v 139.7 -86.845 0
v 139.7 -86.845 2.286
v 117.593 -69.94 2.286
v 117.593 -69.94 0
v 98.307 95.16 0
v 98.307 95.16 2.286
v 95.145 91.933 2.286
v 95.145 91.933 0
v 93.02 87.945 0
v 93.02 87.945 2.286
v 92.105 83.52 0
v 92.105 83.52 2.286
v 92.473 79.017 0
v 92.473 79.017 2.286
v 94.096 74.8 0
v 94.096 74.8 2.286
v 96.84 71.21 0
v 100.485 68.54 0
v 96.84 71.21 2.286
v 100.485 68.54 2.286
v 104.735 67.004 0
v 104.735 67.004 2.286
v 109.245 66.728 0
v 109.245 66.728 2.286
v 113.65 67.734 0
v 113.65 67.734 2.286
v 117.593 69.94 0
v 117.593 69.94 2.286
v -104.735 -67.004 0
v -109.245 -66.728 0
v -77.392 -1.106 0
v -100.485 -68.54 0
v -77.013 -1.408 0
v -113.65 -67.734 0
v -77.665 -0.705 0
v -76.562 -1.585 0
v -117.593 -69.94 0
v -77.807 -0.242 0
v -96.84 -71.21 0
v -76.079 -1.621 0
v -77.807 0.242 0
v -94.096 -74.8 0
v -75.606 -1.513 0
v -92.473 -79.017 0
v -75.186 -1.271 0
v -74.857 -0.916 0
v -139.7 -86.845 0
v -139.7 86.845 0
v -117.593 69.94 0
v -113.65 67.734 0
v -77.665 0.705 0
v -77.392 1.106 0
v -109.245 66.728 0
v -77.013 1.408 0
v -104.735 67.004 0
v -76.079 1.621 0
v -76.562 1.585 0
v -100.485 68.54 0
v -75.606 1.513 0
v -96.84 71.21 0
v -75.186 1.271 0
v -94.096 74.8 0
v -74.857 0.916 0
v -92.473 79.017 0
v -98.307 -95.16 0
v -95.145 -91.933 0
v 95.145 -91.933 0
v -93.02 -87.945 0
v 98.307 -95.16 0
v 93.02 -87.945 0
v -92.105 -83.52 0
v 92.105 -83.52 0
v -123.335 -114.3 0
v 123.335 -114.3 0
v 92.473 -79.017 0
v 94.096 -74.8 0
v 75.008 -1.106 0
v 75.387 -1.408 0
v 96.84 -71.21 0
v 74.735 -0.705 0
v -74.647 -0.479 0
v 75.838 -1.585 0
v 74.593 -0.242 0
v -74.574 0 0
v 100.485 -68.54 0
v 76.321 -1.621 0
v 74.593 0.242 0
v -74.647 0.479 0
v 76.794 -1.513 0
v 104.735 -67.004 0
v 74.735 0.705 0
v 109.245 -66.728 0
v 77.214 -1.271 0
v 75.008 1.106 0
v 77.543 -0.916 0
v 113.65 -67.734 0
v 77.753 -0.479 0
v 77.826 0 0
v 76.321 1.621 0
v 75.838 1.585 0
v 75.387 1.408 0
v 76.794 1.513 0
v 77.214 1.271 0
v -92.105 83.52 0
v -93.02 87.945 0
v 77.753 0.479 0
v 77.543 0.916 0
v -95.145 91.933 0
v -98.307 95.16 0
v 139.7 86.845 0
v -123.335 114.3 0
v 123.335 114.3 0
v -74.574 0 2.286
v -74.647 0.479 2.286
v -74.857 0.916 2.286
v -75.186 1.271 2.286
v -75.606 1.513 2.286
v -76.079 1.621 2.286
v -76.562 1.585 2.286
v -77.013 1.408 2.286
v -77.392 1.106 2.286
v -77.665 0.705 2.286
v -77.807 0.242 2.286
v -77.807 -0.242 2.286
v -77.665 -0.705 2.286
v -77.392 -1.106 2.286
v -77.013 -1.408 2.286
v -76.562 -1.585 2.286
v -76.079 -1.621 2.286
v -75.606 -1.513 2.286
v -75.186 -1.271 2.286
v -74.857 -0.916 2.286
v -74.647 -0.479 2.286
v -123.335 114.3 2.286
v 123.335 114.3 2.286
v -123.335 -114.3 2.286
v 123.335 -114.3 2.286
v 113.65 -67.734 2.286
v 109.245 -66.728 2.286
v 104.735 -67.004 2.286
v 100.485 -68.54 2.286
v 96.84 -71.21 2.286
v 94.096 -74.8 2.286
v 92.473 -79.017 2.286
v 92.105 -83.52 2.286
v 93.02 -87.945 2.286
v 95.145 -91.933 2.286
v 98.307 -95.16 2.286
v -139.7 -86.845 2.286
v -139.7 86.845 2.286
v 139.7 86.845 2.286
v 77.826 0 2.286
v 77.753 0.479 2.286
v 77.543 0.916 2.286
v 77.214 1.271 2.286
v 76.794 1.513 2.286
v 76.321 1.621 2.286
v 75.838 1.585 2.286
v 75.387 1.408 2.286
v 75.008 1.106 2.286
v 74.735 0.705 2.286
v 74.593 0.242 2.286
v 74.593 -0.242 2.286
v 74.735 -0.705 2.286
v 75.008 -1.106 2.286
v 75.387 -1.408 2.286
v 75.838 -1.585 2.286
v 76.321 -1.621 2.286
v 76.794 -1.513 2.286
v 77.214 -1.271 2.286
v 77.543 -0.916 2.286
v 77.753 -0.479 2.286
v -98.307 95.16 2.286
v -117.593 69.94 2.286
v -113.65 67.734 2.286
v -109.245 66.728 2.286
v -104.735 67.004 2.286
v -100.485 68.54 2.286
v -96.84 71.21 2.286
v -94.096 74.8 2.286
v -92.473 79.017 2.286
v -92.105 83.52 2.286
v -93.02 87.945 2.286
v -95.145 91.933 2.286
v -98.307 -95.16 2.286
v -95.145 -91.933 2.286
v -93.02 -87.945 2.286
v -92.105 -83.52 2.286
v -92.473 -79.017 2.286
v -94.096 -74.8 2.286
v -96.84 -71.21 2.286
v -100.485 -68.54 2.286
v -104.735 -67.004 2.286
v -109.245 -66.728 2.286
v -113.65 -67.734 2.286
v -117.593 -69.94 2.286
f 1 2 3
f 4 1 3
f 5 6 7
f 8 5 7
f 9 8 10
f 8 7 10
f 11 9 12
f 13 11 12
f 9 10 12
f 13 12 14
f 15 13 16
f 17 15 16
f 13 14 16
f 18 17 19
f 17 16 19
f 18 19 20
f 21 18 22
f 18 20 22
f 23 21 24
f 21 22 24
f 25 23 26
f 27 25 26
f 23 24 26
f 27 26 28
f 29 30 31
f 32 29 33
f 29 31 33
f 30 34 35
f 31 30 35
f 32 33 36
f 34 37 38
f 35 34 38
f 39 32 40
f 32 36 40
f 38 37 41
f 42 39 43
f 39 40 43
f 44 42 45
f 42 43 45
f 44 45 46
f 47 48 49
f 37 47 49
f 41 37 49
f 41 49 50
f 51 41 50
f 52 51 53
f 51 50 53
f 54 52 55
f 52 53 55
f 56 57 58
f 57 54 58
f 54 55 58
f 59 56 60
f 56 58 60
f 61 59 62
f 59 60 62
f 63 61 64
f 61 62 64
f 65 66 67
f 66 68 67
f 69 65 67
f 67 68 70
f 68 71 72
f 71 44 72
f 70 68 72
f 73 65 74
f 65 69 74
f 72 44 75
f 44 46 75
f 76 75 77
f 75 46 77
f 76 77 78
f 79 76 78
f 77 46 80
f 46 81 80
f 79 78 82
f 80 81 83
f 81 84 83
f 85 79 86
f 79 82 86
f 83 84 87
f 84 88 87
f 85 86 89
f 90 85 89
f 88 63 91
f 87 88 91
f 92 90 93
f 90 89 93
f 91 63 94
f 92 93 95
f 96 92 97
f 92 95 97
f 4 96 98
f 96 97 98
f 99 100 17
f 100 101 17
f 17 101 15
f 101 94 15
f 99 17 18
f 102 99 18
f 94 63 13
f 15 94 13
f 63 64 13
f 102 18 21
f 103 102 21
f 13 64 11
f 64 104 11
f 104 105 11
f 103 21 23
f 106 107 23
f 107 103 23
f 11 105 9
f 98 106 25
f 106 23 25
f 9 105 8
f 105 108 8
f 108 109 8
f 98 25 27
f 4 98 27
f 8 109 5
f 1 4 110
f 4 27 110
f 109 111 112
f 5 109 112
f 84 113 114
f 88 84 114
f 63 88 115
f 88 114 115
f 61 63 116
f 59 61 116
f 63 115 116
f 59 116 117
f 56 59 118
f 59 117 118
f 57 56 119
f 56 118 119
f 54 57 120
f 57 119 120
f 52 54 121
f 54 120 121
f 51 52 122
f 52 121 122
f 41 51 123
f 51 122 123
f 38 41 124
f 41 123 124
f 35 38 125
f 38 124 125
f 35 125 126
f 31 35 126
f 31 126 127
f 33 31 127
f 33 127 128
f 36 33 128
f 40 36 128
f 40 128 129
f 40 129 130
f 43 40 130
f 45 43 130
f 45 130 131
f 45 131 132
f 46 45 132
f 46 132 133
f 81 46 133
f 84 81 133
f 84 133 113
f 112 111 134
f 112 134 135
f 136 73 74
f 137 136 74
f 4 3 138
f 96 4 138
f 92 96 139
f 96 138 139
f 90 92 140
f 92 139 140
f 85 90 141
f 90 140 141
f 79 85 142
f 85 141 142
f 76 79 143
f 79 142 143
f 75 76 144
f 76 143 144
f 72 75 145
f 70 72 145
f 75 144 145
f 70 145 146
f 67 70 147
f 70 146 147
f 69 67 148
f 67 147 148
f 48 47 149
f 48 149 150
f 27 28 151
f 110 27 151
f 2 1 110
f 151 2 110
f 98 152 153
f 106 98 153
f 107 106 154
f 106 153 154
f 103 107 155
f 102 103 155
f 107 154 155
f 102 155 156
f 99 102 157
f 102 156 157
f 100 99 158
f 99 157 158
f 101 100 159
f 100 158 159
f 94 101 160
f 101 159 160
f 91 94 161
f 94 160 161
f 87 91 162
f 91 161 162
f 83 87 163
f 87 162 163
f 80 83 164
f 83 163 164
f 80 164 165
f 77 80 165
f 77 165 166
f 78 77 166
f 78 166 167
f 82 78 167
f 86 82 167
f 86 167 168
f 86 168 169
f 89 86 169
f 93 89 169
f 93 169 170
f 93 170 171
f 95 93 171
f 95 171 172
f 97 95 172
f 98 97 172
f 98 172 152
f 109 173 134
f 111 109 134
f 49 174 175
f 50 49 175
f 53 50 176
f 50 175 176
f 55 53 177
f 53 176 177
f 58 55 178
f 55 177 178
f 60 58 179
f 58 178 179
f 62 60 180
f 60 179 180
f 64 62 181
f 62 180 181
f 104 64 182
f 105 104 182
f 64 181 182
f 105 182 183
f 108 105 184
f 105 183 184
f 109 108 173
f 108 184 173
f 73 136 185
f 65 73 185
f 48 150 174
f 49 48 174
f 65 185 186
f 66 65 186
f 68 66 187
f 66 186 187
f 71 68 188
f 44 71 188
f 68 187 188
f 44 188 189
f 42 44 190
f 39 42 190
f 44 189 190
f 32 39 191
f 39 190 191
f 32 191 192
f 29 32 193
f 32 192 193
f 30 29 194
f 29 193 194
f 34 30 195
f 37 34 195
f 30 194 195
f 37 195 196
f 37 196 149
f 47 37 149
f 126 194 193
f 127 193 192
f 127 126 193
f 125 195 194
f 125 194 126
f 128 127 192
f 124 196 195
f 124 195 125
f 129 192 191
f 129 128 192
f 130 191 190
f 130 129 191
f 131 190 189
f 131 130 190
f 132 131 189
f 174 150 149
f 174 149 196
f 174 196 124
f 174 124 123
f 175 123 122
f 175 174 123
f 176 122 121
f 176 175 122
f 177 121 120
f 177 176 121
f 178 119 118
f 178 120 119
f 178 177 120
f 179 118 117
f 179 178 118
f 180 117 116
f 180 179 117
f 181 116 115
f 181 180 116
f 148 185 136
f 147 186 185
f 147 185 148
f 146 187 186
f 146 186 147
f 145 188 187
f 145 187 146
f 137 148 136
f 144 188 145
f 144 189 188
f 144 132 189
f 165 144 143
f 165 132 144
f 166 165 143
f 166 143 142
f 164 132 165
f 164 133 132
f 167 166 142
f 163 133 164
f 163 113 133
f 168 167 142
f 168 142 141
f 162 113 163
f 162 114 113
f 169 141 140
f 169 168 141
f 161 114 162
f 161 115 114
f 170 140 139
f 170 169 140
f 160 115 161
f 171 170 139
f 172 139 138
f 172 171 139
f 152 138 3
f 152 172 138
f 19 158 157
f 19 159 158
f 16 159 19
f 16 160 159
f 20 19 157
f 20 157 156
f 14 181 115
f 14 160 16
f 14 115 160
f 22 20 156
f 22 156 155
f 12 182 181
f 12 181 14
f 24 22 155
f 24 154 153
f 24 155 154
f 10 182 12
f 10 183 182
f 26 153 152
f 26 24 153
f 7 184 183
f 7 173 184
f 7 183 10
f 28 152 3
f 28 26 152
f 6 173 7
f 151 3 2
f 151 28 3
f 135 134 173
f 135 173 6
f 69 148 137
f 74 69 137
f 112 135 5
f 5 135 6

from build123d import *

# Parameters (mm, degrees)
F0_W     = 279.4
F0_H     = 228.6
F1_DEPTH = 2.286
F3_DEPTH = 2.287
F4_R     = 1.6256
F5_DEPTH = 2.287


with BuildPart() as f1:
    # F0 (on Top) → F1 (new body)
    with BuildSketch(Plane.XY):
        Rectangle(F0_W, F0_H)
    extrude(amount=F1_DEPTH)

    # F2 (on face) → F3 (cut, through all)
    with BuildSketch(Plane.XY.offset(2.286)):
        with BuildLine():
            Line((-170.557151, 110.44136), (-117.59327, 69.939569))
            ThreePointArc((-117.59327, 69.939569), (-95.339569, 72.90673), (-98.30673, 95.160431))
            Line((-98.30673, 95.160431), (-151.27061, 135.662221))
            Line((-151.27061, 135.662221), (-170.557151, 110.44136))
        make_face()
        with BuildLine():
            Line((151.27061, 135.662221), (98.30673, 95.160431))
            ThreePointArc((98.30673, 95.160431), (95.339569, 72.90673), (117.59327, 69.939569))
            Line((117.59327, 69.939569), (170.557151, 110.44136))
            Line((170.557151, 110.44136), (151.27061, 135.662221))
        make_face()
        with BuildLine():
            Line((170.557151, -110.44136), (117.59327, -69.939569))
            ThreePointArc((117.59327, -69.939569), (95.339569, -72.90673), (98.30673, -95.160431))
            Line((98.30673, -95.160431), (151.27061, -135.662221))
            Line((151.27061, -135.662221), (170.557151, -110.44136))
        make_face()
        with BuildLine():
            Line((-151.27061, -135.662221), (-98.30673, -95.160431))
            ThreePointArc((-98.30673, -95.160431), (-95.339569, -72.90673), (-117.59327, -69.939569))
            Line((-117.59327, -69.939569), (-170.557151, -110.44136))
            Line((-170.557151, -110.44136), (-151.27061, -135.662221))
        make_face()
    extrude(amount=-F3_DEPTH, mode=Mode.SUBTRACT)

    # F4 (on face) → F5 (cut, through all)
    with BuildSketch(Plane.XY.offset(2.286)):
        with Locations((76.2, 0)):
            Circle(F4_R)
        with Locations((-76.2, 0)):
            Circle(F4_R)
    extrude(amount=-F5_DEPTH, mode=Mode.SUBTRACT)


solid = f1.part
